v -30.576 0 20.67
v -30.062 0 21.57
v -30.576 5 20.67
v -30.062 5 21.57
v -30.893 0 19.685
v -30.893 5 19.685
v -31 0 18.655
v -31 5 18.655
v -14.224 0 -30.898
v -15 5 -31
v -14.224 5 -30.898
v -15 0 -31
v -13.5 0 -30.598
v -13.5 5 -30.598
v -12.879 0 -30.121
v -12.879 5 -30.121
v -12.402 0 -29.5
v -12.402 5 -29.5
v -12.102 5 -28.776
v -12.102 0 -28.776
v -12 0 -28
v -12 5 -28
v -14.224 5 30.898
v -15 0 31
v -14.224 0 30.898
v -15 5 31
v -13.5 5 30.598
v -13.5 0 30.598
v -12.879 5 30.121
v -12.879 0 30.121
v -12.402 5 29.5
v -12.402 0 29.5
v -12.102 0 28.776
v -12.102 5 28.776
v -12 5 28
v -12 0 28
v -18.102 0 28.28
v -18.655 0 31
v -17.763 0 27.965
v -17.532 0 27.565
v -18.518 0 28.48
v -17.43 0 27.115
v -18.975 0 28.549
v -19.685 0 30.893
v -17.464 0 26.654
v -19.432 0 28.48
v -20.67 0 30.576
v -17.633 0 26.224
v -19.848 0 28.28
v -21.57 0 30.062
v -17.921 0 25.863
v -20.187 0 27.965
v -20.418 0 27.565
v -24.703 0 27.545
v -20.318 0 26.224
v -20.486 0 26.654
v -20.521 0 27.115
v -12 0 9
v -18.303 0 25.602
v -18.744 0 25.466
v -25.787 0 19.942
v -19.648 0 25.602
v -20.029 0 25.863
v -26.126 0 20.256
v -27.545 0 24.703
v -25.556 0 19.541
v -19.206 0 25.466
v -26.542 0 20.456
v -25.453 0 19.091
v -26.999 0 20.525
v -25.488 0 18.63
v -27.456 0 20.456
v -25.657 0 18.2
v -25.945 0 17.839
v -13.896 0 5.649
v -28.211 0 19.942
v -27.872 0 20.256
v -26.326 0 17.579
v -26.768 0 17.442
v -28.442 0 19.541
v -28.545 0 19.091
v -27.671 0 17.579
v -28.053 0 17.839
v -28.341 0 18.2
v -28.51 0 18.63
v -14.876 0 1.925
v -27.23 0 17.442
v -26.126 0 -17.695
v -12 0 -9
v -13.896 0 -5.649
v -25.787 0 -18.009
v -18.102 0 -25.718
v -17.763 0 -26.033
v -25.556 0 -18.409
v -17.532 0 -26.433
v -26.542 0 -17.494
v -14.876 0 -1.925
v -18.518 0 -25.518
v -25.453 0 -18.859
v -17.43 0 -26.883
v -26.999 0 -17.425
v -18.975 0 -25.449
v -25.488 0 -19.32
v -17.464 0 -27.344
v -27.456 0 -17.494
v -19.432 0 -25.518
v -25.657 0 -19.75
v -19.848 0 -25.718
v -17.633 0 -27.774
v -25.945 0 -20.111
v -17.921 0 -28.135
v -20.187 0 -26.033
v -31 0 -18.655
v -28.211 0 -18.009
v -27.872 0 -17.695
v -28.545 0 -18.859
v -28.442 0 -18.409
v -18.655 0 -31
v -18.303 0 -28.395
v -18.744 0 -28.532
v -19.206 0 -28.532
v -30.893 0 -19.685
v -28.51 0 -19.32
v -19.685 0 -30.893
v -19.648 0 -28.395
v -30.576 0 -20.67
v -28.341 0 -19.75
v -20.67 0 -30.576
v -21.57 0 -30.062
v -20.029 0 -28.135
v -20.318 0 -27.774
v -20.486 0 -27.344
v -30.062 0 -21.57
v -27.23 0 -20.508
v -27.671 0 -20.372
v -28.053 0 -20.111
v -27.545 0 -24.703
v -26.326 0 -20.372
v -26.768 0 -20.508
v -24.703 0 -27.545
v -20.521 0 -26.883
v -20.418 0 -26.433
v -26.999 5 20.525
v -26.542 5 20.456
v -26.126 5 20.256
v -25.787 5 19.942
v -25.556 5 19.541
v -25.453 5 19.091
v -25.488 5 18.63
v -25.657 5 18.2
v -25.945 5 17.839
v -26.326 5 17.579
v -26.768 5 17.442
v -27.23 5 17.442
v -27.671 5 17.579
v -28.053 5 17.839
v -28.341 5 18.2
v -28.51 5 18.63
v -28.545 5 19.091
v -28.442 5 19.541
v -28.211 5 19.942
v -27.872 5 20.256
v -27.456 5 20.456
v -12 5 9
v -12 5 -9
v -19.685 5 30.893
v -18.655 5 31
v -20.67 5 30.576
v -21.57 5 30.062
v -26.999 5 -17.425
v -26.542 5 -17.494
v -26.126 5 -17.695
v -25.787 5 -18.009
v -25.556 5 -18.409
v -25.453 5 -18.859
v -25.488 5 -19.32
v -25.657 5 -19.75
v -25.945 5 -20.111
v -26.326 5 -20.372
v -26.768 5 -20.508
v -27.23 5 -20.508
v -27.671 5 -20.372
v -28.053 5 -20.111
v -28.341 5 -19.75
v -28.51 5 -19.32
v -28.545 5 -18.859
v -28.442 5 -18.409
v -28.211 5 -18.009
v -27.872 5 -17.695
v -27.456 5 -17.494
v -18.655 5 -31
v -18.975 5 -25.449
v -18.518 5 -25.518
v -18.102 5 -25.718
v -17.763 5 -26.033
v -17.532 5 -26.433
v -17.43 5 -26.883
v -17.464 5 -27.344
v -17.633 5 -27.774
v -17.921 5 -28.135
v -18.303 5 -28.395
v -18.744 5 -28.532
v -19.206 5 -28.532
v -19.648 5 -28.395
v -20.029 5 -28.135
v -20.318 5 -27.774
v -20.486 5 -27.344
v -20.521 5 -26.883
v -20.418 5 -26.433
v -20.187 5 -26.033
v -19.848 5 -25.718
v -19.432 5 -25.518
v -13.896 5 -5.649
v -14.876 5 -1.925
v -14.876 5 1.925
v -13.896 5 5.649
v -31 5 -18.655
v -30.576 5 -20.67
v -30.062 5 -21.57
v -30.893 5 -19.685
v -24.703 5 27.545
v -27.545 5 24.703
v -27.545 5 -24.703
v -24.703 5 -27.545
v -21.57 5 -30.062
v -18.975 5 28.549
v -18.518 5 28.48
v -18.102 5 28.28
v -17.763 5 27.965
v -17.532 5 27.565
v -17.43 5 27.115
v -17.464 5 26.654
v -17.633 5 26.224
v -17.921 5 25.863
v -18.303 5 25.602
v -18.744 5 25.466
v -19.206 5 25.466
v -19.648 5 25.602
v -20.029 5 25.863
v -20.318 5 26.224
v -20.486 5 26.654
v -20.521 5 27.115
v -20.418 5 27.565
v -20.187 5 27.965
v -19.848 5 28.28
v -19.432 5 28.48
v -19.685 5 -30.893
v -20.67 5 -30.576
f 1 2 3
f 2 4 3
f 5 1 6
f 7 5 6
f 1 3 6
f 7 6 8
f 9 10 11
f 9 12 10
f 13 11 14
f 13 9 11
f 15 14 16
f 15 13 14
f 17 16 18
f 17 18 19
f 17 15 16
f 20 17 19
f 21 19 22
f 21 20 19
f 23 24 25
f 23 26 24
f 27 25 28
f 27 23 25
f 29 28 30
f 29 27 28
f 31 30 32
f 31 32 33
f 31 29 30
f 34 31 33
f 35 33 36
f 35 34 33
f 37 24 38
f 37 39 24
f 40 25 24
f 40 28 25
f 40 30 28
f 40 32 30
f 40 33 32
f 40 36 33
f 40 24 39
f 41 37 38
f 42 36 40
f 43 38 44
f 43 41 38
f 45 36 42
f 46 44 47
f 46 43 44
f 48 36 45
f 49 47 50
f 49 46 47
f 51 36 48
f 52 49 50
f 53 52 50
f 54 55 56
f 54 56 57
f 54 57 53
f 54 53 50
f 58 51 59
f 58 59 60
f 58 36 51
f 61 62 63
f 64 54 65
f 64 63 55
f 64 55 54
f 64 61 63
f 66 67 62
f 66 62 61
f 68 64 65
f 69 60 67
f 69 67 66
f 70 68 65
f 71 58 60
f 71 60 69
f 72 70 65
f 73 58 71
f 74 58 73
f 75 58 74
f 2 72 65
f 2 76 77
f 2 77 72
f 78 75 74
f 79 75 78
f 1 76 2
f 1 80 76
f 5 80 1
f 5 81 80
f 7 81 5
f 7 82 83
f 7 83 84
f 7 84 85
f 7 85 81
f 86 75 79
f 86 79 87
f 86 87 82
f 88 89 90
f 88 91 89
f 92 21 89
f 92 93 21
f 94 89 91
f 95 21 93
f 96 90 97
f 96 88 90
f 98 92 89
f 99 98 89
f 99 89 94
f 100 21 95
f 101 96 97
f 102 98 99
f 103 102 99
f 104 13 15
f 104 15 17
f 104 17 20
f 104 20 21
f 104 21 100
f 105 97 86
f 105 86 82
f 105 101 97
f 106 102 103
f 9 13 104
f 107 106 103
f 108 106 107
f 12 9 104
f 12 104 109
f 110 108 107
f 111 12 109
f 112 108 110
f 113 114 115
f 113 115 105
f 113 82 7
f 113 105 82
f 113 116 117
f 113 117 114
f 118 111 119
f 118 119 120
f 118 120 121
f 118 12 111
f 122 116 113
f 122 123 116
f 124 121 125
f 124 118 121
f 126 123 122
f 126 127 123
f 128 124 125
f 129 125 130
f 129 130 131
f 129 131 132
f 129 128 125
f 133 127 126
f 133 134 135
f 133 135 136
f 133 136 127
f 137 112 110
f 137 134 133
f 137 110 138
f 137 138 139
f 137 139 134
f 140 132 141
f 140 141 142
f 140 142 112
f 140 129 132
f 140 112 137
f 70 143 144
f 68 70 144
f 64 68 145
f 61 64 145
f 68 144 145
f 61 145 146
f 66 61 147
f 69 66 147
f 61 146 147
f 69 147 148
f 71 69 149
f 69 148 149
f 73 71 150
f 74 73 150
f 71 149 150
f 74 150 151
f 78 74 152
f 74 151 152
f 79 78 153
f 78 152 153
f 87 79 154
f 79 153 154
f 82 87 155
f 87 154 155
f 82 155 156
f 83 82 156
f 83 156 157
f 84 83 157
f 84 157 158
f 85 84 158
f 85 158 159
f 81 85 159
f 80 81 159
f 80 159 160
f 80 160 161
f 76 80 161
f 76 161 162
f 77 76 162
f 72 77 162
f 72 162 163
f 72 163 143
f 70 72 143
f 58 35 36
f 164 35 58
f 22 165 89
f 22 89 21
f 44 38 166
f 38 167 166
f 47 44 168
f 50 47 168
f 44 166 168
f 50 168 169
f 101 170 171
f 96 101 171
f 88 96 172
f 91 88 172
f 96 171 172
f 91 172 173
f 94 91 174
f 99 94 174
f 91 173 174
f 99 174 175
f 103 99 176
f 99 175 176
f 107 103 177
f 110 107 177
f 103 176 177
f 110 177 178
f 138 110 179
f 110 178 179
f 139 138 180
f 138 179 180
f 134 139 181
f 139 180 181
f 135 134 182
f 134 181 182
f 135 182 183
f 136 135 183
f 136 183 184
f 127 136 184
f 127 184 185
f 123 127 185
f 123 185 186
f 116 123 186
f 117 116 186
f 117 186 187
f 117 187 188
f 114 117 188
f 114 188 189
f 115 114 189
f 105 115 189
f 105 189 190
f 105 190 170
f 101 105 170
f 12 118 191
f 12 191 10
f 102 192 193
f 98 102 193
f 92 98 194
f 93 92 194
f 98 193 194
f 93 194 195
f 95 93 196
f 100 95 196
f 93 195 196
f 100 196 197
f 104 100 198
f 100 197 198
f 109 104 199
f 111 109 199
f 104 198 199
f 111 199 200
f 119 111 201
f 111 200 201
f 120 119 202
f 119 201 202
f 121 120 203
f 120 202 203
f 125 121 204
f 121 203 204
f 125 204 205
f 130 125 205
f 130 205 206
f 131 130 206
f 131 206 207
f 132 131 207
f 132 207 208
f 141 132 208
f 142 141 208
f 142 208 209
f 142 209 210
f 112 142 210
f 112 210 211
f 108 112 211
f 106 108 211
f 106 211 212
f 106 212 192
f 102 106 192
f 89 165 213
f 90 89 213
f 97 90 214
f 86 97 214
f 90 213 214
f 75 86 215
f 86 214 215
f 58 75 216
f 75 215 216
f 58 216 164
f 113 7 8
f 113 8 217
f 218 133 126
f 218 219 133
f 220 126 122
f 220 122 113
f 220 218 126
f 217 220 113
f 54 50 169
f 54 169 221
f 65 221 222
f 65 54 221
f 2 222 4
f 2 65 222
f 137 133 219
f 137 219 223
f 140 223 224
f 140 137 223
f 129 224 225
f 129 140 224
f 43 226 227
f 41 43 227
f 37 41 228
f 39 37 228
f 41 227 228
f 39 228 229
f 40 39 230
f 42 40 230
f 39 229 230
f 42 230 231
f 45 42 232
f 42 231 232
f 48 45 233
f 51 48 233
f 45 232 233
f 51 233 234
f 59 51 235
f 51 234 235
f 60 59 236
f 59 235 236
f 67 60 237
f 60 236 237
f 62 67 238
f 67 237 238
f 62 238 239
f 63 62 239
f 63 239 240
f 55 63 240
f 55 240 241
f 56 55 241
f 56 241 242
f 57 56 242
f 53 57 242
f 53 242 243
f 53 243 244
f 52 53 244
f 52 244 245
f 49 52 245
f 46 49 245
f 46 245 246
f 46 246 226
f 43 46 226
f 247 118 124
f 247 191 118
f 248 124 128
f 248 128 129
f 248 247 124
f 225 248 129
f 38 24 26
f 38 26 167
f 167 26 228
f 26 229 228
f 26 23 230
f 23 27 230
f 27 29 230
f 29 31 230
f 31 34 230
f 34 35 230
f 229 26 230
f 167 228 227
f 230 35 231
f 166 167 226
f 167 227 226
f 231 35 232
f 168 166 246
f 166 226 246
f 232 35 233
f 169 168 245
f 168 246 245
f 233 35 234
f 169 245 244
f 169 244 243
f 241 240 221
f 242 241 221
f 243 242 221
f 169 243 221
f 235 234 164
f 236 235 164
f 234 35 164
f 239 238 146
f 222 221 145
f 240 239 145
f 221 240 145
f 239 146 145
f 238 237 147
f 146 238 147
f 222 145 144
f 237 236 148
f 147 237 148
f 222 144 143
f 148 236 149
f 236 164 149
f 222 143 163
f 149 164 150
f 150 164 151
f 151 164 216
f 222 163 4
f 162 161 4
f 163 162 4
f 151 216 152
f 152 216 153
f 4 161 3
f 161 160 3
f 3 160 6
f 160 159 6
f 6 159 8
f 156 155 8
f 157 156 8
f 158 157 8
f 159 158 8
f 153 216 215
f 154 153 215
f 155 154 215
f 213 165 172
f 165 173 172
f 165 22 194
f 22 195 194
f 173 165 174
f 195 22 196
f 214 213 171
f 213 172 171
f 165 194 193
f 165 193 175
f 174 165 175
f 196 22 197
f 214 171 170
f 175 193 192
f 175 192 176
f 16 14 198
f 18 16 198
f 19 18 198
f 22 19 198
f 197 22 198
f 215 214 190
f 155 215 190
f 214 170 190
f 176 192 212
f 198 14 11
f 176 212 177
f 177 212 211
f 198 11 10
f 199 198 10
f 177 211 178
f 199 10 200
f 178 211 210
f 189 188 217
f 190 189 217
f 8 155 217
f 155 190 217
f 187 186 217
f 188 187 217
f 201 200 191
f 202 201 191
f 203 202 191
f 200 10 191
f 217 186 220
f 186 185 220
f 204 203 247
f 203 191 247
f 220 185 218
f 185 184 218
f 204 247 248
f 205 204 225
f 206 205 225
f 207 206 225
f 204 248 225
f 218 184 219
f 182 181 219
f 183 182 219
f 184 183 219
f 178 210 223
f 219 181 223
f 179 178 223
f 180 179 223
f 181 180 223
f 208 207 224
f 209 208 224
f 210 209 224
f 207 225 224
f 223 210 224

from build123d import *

# Parameters (mm, degrees)
EXTRUDE_1_DEPTH     = 5
SKETCH_2_R          = 15
CUT_EXTRUDE_1_DEPTH = 10
SKETCH_3_R          = 1.55
CUT_EXTRUDE_2_DEPTH = 10
SKETCH_7_W          = 49.108203812
SKETCH_7_H          = 84.922292299
CUT_EXTRUDE_4_DEPTH = 10
FILLET_1_R          = 3
FILLET_2_R          = 5


with BuildPart() as part:
    # 草图1 → 凸台-拉伸1 (new body)
    with BuildSketch(Plane(origin=(0, 0, 0), x_dir=(1, 0, 0), z_dir=(0, 1, 0))):
        with BuildLine():
            Line((-20.199009877, 31), (20.199009877, 31))
            ThreePointArc((20.199009877, 31), (26.162950904, 26.162950904), (31, 20.199009877))
            Line((31, 20.199009877), (31, -20.199009877))
            ThreePointArc((31, -20.199009877), (26.162950904, -26.162950904), (20.199009877, -31))
            Line((20.199009877, -31), (-20.199009877, -31))
            ThreePointArc((-20.199009877, -31), (-26.162950904, -26.162950904), (-31, -20.199009877))
            Line((-31, -20.199009877), (-31, 20.199009877))
            ThreePointArc((-31, 20.199009877), (-26.162950904, 26.162950904), (-20.199009877, 31))
        make_face()
    extrude(amount=EXTRUDE_1_DEPTH)

    # 草图2 → 切除-拉伸1 (cut)
    with BuildSketch(Plane(origin=(0, 5, 0), x_dir=(1, 0, 0), z_dir=(0, 1, 0))):
        with Locations(Location((0, 0, 0), (0, 0, 270))):
            Circle(SKETCH_2_R)
    extrude(amount=-CUT_EXTRUDE_1_DEPTH, mode=Mode.SUBTRACT)

    # 草图3 → 切除-拉伸2 (cut)
    with BuildSketch(Plane(origin=(0, 5, 0), x_dir=(1, 0, 0), z_dir=(0, 1, 0))):
        with Locations(Location((-26.998940675, 18.975173317, 0), (0, 0, 270))):
            Circle(SKETCH_3_R)
        with Locations(Location((-18.975173317, 26.998940675, 0), (0, 0, 270))):
            Circle(SKETCH_3_R)
        with Locations(Location((26.998940675, 18.975173317, 0), (0, 0, 270))):
            Circle(SKETCH_3_R)
        with Locations(Location((18.975173317, 26.998940675, 0), (0, 0, 270))):
            Circle(SKETCH_3_R)
        with Locations(Location((26.998940675, -18.975173317, 0), (0, 0, 270))):
            Circle(SKETCH_3_R)
        with Locations(Location((18.975173317, -26.998940675, 0), (0, 0, 270))):
            Circle(SKETCH_3_R)
        with Locations(Location((-26.998940675, -18.975173317, 0), (0, 0, 270))):
            Circle(SKETCH_3_R)
        with Locations(Location((-18.975173317, -26.998940675, 0), (0, 0, 270))):
            Circle(SKETCH_3_R)
    extrude(amount=-CUT_EXTRUDE_2_DEPTH, mode=Mode.SUBTRACT)

    # 草图7 → 切除-拉伸4 (cut)
    with BuildSketch(Plane(origin=(0, 5, 0), x_dir=(1, 0, 0), z_dir=(0, 1, 0))):
        with Locations((12.554101906, 6.469881358)):
            Rectangle(SKETCH_7_W, SKETCH_7_H)
    extrude(amount=-CUT_EXTRUDE_4_DEPTH, mode=Mode.SUBTRACT)

    # 圆角1
    fillet_1_edges = [part.edges().sort_by_distance(p)[0] for p in [
        (-12, 2.5, 31),
        (-12, 2.5, -31),
    ]]
    fillet(fillet_1_edges, radius=FILLET_1_R)

    # 圆角2
    fillet_2_edges = [part.edges().sort_by_distance(p)[0] for p in [
        (-20.199009877, 2.5, -31),
        (-20.199009877, 2.5, 31),
        (-31, 2.5, 20.199009877),
        (-31, 2.5, -20.199009877),
    ]]
    fillet(fillet_2_edges, radius=FILLET_2_R)


solid = part.part
